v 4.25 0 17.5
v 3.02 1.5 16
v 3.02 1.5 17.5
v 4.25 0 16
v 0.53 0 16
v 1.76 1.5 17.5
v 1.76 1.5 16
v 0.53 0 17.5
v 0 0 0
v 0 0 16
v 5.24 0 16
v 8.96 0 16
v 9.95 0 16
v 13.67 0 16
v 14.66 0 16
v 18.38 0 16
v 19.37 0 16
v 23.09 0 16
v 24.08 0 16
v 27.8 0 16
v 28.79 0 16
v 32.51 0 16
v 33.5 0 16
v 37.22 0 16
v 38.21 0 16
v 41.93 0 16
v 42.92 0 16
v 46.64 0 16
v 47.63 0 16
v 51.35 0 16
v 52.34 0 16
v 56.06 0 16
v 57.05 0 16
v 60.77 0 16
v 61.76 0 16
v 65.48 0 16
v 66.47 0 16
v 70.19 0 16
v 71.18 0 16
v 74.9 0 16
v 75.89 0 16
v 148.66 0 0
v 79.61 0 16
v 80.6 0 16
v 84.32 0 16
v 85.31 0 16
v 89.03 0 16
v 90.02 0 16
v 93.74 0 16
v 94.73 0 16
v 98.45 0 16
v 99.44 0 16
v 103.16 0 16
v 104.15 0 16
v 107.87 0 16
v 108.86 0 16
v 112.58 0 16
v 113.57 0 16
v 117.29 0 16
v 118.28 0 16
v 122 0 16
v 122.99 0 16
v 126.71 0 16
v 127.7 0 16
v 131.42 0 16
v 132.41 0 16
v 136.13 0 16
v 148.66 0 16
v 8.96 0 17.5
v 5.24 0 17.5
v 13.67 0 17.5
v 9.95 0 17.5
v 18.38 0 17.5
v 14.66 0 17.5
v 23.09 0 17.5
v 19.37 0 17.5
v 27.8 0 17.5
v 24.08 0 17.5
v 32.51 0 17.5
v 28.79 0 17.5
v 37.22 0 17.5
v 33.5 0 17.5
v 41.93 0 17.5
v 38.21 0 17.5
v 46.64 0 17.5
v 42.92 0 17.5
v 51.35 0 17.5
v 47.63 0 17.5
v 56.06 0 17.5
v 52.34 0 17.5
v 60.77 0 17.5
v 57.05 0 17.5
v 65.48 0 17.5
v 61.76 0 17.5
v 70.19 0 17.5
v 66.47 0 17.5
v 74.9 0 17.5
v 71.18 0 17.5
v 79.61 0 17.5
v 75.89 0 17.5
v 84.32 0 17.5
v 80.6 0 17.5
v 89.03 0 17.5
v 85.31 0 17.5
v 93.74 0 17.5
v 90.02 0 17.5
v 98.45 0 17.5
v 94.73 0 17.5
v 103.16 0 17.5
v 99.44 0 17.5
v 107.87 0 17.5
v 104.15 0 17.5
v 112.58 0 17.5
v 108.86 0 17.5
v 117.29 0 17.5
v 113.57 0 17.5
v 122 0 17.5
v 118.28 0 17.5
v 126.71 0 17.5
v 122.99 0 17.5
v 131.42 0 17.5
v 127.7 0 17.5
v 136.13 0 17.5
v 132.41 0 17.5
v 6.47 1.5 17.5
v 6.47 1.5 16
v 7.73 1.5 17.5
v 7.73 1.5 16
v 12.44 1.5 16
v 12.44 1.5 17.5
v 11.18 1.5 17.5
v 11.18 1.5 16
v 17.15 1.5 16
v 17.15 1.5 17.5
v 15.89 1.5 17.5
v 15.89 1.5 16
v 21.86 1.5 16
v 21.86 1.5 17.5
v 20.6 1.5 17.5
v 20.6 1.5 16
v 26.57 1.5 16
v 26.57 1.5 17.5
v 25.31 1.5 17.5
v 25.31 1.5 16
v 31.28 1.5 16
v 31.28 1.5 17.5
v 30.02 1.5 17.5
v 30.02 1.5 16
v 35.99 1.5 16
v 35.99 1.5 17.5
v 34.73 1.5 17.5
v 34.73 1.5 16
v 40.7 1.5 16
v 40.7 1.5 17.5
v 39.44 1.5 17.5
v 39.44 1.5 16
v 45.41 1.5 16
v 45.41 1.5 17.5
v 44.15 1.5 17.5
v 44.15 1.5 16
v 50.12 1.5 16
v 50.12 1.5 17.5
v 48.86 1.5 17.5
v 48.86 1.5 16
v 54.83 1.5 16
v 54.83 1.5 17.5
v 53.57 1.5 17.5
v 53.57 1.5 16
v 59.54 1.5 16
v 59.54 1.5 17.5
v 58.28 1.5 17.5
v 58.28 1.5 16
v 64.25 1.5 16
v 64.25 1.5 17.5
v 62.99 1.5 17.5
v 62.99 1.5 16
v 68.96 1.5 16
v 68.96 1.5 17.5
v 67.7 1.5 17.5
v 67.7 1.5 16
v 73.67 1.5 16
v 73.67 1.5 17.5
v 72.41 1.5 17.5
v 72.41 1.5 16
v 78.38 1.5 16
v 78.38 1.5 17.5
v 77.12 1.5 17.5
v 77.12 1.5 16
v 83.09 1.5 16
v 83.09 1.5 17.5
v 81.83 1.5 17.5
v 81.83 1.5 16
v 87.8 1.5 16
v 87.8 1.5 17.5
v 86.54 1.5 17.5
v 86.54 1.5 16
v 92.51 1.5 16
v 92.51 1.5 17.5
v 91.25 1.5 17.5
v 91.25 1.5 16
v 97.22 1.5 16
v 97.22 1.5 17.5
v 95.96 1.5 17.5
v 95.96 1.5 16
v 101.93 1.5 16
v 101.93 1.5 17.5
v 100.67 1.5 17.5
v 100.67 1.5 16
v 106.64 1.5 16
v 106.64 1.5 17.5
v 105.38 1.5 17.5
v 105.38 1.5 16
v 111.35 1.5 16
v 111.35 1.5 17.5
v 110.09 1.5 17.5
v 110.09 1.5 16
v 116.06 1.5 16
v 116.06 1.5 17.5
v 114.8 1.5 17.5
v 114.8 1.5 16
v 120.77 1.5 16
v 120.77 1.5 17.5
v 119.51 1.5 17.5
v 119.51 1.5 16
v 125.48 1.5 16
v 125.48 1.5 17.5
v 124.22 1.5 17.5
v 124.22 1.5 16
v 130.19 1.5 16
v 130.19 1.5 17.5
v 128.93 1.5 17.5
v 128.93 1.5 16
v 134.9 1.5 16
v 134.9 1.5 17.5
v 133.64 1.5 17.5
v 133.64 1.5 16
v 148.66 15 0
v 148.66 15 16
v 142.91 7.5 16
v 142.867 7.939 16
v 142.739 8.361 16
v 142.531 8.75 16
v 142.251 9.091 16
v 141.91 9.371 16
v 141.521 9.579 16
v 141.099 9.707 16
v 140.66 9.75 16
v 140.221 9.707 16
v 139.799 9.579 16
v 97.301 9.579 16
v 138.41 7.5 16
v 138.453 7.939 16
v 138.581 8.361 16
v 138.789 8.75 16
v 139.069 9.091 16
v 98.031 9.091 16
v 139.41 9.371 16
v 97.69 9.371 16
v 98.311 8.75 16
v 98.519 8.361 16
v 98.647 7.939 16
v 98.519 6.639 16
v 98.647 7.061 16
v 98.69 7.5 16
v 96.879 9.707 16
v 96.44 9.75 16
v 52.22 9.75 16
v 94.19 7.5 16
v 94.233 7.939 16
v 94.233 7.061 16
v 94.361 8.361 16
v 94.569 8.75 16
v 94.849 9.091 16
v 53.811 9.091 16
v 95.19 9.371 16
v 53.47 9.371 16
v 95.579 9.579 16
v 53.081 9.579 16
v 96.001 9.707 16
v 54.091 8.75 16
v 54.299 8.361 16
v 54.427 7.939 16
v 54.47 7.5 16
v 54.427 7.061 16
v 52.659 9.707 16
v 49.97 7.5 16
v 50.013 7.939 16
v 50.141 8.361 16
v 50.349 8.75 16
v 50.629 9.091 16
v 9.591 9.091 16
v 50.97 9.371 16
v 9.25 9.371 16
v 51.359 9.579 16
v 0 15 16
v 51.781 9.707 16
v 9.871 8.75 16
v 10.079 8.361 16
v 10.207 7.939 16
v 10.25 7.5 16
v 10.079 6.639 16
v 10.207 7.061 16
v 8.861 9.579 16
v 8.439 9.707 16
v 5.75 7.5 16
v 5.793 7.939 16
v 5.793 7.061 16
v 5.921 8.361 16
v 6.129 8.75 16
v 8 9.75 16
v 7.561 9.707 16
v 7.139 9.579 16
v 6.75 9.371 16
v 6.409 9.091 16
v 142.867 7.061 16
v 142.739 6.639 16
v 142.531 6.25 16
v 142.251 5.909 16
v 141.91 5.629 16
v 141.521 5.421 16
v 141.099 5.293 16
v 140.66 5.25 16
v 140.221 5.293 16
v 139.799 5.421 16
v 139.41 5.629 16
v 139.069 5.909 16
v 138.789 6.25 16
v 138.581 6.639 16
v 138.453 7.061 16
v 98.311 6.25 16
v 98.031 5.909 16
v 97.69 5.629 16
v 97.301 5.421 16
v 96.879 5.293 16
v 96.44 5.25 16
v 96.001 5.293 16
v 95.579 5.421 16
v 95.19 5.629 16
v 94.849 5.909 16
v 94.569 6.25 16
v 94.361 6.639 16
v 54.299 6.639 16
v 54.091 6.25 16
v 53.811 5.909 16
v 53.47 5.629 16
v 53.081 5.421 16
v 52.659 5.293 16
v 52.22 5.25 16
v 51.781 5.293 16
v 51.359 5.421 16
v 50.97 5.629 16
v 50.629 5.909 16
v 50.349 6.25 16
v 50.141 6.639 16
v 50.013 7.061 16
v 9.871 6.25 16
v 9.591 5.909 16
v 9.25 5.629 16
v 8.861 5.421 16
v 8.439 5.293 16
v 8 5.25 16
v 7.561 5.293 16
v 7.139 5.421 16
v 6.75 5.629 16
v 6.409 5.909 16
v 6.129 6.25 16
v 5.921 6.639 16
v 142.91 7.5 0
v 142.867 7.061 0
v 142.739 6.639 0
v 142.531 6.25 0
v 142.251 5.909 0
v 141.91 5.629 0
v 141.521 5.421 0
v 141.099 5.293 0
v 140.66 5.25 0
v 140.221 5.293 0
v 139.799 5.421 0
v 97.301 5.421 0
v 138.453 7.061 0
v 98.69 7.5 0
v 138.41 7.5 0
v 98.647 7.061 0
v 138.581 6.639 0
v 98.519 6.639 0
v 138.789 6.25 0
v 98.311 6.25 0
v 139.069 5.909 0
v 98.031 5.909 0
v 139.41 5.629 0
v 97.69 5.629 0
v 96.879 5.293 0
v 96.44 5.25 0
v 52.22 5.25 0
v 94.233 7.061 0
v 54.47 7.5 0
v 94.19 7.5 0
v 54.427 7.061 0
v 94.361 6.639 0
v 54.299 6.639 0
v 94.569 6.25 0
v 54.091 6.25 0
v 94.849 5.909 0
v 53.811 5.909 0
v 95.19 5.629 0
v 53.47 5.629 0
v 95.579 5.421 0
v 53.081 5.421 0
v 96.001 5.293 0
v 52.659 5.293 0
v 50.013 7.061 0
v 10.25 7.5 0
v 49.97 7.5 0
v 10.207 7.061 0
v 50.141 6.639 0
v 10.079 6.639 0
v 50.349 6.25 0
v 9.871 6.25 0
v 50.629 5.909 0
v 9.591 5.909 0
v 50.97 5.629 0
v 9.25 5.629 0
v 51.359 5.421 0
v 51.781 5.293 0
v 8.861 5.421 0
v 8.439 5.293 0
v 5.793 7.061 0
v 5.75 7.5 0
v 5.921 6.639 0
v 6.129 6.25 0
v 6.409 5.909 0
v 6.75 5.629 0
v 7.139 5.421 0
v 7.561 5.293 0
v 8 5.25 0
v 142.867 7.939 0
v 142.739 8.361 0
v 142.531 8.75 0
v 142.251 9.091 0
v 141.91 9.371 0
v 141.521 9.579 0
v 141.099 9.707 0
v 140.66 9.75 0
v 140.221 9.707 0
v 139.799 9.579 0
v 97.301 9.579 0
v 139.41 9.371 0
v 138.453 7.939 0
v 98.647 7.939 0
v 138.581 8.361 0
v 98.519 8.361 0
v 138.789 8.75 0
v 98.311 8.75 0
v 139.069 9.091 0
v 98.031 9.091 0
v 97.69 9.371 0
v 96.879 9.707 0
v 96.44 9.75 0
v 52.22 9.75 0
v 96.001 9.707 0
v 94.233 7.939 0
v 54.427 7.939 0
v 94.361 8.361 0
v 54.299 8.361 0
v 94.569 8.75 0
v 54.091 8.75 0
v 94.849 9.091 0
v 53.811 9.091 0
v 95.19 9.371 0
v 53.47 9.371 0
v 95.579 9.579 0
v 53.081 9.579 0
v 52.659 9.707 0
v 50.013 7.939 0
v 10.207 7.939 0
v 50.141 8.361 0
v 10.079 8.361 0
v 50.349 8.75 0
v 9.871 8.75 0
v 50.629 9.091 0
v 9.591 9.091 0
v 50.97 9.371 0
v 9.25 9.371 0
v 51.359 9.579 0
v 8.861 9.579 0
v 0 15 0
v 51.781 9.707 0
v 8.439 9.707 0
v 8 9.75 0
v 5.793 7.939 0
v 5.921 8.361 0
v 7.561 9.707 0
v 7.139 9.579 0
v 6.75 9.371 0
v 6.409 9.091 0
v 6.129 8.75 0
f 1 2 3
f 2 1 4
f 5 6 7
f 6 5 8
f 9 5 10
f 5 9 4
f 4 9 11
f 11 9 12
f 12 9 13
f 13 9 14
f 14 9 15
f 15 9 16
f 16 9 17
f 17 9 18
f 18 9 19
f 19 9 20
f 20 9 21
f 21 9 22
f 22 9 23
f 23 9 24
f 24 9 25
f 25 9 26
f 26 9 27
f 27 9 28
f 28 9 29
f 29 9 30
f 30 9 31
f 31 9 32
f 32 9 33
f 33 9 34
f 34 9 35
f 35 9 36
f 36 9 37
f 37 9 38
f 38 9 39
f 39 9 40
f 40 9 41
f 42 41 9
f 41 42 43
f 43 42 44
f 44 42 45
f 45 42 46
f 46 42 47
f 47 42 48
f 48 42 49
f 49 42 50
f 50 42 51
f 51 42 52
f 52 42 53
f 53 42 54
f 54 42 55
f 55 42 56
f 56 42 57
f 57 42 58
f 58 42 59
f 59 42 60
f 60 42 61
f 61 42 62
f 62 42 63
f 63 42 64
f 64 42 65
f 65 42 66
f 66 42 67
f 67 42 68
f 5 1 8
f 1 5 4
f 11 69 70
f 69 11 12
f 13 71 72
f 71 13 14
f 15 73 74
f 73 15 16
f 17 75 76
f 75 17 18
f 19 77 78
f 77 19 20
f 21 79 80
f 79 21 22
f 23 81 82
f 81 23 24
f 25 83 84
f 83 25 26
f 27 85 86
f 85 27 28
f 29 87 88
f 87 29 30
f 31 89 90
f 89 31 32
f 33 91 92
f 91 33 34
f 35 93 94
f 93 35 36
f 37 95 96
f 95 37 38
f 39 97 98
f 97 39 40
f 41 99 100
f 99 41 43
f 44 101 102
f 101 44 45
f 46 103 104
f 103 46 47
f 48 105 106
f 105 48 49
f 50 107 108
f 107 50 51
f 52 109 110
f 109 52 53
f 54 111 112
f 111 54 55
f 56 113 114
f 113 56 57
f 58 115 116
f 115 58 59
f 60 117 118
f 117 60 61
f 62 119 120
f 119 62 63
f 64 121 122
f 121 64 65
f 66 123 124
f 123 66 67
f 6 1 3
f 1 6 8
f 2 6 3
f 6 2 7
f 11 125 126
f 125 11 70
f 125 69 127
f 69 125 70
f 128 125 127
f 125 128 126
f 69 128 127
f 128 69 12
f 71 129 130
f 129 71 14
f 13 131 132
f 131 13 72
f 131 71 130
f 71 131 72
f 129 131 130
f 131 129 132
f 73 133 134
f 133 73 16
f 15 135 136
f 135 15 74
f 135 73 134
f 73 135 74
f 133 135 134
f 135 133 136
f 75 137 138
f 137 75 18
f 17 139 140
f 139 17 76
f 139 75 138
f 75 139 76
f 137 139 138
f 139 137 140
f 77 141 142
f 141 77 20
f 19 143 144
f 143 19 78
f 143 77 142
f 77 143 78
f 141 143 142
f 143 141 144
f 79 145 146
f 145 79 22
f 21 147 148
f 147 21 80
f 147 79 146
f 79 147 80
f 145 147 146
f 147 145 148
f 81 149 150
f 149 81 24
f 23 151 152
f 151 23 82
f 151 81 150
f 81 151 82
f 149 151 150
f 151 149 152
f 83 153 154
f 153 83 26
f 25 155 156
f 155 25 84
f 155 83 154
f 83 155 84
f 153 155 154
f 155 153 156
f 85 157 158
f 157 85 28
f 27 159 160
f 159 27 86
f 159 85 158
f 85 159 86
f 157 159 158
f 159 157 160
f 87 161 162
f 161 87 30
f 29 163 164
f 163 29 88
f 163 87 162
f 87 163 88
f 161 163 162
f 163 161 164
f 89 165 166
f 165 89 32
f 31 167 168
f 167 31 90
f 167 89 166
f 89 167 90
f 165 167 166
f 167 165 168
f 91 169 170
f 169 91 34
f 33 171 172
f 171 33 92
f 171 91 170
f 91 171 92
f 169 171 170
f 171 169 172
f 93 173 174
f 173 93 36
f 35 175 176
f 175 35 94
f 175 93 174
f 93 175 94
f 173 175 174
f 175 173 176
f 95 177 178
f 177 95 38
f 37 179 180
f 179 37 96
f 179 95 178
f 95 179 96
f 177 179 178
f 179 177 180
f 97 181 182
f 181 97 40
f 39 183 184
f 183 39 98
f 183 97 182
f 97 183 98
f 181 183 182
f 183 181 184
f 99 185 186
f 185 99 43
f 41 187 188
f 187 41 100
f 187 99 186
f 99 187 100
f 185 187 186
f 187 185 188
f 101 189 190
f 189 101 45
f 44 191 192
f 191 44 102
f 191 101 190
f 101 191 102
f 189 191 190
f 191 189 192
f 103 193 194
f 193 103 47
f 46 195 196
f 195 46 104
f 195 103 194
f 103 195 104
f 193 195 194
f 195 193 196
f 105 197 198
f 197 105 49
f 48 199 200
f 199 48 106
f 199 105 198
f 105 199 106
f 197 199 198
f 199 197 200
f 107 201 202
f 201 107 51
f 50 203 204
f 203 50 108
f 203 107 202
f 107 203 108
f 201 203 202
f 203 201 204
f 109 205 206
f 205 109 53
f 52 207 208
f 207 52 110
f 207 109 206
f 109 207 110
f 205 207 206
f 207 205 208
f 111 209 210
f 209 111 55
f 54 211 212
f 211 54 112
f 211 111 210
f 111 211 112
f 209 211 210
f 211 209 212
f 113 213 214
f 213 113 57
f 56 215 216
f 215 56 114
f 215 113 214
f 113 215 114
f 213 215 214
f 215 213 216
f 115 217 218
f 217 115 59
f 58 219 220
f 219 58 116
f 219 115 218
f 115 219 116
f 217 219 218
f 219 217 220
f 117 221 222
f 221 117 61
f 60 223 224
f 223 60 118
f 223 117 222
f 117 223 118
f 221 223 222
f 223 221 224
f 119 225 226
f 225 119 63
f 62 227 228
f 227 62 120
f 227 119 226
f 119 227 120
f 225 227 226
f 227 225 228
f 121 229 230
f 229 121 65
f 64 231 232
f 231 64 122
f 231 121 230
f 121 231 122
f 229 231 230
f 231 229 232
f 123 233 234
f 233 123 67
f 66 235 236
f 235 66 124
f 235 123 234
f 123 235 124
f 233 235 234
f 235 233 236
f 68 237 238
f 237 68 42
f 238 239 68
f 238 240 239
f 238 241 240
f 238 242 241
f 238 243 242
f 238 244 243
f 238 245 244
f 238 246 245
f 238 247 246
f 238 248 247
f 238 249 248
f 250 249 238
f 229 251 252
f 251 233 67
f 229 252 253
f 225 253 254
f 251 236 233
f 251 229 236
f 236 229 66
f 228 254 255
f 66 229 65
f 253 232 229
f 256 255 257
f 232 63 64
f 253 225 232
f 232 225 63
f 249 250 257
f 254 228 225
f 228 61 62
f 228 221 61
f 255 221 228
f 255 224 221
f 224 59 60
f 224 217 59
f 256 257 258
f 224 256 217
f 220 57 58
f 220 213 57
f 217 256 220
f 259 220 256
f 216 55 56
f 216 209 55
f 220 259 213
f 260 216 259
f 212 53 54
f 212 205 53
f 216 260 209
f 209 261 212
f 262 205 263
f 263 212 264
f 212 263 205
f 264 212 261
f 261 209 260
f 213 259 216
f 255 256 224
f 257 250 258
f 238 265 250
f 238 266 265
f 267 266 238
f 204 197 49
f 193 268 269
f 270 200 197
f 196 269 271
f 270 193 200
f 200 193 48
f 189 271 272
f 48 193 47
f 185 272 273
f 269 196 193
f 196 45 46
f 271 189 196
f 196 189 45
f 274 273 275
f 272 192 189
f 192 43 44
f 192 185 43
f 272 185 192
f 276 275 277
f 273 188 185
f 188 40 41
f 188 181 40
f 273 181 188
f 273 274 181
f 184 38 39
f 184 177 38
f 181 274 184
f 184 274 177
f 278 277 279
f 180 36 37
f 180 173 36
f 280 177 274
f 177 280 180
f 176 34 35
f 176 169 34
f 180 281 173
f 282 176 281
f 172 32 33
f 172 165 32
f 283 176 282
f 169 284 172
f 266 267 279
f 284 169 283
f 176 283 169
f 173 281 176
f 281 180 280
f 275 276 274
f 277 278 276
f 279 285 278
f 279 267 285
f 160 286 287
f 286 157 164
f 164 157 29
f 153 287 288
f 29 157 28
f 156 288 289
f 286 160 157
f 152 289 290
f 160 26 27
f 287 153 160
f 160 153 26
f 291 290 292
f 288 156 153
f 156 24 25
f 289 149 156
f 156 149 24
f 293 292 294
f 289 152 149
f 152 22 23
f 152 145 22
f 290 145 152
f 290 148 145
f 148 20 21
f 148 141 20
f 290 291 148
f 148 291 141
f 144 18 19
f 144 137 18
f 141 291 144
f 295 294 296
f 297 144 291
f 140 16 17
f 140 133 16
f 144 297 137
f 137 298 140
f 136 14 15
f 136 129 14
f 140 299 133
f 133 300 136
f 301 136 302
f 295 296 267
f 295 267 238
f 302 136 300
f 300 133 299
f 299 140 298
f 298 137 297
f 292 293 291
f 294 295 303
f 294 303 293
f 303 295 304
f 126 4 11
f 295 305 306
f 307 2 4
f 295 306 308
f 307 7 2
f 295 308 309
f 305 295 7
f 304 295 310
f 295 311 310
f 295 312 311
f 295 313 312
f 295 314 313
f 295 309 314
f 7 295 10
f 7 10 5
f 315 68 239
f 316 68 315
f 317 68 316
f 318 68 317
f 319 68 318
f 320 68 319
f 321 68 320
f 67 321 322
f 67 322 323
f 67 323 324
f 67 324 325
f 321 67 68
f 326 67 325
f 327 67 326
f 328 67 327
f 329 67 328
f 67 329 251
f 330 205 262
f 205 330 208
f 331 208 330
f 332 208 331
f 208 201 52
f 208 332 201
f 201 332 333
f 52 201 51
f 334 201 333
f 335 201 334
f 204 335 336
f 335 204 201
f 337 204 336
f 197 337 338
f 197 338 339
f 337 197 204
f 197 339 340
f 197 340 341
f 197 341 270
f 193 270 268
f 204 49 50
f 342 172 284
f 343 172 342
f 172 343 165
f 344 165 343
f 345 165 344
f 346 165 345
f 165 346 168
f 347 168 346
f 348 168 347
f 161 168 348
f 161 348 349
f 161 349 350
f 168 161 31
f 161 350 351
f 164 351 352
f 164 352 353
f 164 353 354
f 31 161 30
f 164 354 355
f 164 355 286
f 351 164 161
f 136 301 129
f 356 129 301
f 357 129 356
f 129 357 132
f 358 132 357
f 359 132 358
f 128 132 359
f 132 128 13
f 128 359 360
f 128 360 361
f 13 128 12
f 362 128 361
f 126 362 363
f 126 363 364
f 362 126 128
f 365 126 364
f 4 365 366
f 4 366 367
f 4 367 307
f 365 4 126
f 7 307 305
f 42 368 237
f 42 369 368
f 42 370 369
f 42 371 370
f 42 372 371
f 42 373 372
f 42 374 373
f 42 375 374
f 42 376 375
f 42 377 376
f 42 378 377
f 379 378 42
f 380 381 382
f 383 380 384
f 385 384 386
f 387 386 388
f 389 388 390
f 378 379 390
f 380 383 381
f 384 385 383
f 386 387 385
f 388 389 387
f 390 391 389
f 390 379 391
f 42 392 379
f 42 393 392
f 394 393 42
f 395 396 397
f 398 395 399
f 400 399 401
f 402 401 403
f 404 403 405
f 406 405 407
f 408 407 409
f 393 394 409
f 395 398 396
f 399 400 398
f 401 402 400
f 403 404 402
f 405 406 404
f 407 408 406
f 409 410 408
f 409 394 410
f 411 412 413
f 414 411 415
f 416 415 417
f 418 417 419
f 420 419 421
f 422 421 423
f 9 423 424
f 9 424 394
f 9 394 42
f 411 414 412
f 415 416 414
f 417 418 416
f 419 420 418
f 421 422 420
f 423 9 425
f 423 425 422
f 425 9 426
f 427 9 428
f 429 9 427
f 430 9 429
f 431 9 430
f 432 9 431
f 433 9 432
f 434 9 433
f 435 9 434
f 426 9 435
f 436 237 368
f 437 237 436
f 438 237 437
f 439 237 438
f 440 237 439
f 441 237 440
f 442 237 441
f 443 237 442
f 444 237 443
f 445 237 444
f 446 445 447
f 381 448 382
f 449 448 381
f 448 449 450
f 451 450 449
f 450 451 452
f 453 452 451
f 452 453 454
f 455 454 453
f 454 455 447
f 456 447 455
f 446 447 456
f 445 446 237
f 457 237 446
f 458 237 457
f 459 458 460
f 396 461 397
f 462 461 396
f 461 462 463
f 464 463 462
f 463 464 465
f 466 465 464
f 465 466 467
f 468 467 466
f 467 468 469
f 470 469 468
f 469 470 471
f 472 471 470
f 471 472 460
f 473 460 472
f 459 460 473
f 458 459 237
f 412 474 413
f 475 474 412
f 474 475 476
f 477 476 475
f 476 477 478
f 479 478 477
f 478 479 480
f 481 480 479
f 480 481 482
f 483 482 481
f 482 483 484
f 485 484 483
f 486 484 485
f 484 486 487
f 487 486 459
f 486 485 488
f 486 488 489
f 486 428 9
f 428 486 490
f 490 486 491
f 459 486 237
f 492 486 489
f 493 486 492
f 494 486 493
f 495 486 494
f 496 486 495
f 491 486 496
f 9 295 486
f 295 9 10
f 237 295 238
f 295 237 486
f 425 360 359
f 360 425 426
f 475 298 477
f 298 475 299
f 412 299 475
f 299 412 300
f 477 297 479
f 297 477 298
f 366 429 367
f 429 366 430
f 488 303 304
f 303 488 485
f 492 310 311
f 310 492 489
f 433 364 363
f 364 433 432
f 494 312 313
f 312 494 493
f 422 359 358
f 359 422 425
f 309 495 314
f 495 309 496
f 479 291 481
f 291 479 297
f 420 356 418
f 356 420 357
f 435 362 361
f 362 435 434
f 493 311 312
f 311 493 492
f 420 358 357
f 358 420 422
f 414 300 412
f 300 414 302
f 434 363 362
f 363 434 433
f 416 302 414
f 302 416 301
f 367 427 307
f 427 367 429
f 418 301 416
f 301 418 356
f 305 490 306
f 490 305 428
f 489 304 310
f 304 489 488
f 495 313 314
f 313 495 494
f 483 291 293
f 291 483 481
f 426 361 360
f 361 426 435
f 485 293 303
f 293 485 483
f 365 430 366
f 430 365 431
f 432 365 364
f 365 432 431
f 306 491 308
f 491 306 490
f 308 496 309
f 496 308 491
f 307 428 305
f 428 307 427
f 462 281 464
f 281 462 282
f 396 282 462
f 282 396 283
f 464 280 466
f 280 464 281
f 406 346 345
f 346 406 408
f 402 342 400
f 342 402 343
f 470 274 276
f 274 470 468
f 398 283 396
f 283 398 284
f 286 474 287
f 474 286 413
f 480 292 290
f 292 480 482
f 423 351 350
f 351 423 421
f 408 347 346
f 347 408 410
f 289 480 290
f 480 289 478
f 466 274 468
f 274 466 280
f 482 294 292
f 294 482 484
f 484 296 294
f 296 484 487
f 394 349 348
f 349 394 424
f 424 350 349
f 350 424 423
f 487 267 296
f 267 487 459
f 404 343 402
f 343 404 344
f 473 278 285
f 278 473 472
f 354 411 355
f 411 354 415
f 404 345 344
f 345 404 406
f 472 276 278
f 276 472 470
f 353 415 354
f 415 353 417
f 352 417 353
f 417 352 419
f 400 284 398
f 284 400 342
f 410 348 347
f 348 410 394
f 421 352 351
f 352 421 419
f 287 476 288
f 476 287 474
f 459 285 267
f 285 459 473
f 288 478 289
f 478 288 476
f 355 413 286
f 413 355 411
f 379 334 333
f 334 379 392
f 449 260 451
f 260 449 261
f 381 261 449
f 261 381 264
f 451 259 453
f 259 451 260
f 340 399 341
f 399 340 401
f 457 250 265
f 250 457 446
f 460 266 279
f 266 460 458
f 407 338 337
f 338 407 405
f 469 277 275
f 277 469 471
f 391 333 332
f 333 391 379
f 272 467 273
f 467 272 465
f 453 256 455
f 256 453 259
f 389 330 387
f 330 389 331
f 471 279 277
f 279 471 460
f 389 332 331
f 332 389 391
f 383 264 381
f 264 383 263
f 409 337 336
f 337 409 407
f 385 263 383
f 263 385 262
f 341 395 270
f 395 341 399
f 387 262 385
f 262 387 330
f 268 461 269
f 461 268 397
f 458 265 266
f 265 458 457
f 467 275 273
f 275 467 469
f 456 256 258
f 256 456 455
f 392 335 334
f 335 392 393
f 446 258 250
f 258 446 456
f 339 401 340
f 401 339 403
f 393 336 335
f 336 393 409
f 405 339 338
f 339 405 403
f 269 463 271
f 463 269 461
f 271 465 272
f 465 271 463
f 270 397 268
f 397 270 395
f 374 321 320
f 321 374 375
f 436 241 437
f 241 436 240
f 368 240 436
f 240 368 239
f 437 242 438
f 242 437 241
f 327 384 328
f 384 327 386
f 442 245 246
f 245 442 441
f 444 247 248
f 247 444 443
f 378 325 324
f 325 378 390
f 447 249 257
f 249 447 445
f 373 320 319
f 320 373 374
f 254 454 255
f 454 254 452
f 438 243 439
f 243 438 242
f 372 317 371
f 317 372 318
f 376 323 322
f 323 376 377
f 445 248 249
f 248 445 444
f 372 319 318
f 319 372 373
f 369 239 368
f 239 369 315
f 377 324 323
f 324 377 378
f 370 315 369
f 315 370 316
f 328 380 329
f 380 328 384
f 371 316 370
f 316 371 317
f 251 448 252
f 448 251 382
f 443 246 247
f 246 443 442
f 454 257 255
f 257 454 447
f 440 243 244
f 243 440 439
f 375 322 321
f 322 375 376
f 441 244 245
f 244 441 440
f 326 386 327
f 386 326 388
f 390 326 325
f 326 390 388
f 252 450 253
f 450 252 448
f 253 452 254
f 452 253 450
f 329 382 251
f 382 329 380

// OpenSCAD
$fn = 32;

// ----------------------------------------------------------------------
// Gear rack: m=1.5 z=29, 148.66 x 15 x 17.5 mm
// ----------------------------------------------------------------------

// --- parameters (mm) ---
bar_len = 148.66;         // rack length, X
bar_w = 15;               // rack width, Y
bar_h = 17.5;             // overall height, Z
gear_module = 1.5;        // module
base_t = 16;              // tooth root line height
pitch = 4.71;             // circular pitch
tip_w = 1.26;             // tooth thickness at the tip
root_w = 3.72;            // tooth thickness at the root line
hole_d = 4.5;             // mounting hole
sink = 0.6;               // tooth root overlap into the body

tooth_span = 136.66;

module tooth(x0) {
  /* 20 deg flank profile, sunk into the body for a positive overlap */
  translate([x0, 0, base_t - sink])
    linear_extrude(height = bar_h - base_t + sink)
      polygon(points = [[-root_w / 2, 0], [root_w / 2, 0],
                        [tip_w / 2, bar_h - base_t],
                        [-tip_w / 2, bar_h - base_t]]);
}

difference() {
  union() {
    cube([bar_len, bar_w, base_t]);
    for (i = [0 : 29 - 1])
      tooth((i + 0.5) * pitch + (tooth_span - 29 * pitch) / 2);
  }
  translate([8, 7.5, -1]) cylinder(h = base_t + 2, d = hole_d);
  translate([52.22, 7.5, -1]) cylinder(h = base_t + 2, d = hole_d);
  translate([96.44, 7.5, -1]) cylinder(h = base_t + 2, d = hole_d);
  translate([140.66, 7.5, -1]) cylinder(h = base_t + 2, d = hole_d);
}
